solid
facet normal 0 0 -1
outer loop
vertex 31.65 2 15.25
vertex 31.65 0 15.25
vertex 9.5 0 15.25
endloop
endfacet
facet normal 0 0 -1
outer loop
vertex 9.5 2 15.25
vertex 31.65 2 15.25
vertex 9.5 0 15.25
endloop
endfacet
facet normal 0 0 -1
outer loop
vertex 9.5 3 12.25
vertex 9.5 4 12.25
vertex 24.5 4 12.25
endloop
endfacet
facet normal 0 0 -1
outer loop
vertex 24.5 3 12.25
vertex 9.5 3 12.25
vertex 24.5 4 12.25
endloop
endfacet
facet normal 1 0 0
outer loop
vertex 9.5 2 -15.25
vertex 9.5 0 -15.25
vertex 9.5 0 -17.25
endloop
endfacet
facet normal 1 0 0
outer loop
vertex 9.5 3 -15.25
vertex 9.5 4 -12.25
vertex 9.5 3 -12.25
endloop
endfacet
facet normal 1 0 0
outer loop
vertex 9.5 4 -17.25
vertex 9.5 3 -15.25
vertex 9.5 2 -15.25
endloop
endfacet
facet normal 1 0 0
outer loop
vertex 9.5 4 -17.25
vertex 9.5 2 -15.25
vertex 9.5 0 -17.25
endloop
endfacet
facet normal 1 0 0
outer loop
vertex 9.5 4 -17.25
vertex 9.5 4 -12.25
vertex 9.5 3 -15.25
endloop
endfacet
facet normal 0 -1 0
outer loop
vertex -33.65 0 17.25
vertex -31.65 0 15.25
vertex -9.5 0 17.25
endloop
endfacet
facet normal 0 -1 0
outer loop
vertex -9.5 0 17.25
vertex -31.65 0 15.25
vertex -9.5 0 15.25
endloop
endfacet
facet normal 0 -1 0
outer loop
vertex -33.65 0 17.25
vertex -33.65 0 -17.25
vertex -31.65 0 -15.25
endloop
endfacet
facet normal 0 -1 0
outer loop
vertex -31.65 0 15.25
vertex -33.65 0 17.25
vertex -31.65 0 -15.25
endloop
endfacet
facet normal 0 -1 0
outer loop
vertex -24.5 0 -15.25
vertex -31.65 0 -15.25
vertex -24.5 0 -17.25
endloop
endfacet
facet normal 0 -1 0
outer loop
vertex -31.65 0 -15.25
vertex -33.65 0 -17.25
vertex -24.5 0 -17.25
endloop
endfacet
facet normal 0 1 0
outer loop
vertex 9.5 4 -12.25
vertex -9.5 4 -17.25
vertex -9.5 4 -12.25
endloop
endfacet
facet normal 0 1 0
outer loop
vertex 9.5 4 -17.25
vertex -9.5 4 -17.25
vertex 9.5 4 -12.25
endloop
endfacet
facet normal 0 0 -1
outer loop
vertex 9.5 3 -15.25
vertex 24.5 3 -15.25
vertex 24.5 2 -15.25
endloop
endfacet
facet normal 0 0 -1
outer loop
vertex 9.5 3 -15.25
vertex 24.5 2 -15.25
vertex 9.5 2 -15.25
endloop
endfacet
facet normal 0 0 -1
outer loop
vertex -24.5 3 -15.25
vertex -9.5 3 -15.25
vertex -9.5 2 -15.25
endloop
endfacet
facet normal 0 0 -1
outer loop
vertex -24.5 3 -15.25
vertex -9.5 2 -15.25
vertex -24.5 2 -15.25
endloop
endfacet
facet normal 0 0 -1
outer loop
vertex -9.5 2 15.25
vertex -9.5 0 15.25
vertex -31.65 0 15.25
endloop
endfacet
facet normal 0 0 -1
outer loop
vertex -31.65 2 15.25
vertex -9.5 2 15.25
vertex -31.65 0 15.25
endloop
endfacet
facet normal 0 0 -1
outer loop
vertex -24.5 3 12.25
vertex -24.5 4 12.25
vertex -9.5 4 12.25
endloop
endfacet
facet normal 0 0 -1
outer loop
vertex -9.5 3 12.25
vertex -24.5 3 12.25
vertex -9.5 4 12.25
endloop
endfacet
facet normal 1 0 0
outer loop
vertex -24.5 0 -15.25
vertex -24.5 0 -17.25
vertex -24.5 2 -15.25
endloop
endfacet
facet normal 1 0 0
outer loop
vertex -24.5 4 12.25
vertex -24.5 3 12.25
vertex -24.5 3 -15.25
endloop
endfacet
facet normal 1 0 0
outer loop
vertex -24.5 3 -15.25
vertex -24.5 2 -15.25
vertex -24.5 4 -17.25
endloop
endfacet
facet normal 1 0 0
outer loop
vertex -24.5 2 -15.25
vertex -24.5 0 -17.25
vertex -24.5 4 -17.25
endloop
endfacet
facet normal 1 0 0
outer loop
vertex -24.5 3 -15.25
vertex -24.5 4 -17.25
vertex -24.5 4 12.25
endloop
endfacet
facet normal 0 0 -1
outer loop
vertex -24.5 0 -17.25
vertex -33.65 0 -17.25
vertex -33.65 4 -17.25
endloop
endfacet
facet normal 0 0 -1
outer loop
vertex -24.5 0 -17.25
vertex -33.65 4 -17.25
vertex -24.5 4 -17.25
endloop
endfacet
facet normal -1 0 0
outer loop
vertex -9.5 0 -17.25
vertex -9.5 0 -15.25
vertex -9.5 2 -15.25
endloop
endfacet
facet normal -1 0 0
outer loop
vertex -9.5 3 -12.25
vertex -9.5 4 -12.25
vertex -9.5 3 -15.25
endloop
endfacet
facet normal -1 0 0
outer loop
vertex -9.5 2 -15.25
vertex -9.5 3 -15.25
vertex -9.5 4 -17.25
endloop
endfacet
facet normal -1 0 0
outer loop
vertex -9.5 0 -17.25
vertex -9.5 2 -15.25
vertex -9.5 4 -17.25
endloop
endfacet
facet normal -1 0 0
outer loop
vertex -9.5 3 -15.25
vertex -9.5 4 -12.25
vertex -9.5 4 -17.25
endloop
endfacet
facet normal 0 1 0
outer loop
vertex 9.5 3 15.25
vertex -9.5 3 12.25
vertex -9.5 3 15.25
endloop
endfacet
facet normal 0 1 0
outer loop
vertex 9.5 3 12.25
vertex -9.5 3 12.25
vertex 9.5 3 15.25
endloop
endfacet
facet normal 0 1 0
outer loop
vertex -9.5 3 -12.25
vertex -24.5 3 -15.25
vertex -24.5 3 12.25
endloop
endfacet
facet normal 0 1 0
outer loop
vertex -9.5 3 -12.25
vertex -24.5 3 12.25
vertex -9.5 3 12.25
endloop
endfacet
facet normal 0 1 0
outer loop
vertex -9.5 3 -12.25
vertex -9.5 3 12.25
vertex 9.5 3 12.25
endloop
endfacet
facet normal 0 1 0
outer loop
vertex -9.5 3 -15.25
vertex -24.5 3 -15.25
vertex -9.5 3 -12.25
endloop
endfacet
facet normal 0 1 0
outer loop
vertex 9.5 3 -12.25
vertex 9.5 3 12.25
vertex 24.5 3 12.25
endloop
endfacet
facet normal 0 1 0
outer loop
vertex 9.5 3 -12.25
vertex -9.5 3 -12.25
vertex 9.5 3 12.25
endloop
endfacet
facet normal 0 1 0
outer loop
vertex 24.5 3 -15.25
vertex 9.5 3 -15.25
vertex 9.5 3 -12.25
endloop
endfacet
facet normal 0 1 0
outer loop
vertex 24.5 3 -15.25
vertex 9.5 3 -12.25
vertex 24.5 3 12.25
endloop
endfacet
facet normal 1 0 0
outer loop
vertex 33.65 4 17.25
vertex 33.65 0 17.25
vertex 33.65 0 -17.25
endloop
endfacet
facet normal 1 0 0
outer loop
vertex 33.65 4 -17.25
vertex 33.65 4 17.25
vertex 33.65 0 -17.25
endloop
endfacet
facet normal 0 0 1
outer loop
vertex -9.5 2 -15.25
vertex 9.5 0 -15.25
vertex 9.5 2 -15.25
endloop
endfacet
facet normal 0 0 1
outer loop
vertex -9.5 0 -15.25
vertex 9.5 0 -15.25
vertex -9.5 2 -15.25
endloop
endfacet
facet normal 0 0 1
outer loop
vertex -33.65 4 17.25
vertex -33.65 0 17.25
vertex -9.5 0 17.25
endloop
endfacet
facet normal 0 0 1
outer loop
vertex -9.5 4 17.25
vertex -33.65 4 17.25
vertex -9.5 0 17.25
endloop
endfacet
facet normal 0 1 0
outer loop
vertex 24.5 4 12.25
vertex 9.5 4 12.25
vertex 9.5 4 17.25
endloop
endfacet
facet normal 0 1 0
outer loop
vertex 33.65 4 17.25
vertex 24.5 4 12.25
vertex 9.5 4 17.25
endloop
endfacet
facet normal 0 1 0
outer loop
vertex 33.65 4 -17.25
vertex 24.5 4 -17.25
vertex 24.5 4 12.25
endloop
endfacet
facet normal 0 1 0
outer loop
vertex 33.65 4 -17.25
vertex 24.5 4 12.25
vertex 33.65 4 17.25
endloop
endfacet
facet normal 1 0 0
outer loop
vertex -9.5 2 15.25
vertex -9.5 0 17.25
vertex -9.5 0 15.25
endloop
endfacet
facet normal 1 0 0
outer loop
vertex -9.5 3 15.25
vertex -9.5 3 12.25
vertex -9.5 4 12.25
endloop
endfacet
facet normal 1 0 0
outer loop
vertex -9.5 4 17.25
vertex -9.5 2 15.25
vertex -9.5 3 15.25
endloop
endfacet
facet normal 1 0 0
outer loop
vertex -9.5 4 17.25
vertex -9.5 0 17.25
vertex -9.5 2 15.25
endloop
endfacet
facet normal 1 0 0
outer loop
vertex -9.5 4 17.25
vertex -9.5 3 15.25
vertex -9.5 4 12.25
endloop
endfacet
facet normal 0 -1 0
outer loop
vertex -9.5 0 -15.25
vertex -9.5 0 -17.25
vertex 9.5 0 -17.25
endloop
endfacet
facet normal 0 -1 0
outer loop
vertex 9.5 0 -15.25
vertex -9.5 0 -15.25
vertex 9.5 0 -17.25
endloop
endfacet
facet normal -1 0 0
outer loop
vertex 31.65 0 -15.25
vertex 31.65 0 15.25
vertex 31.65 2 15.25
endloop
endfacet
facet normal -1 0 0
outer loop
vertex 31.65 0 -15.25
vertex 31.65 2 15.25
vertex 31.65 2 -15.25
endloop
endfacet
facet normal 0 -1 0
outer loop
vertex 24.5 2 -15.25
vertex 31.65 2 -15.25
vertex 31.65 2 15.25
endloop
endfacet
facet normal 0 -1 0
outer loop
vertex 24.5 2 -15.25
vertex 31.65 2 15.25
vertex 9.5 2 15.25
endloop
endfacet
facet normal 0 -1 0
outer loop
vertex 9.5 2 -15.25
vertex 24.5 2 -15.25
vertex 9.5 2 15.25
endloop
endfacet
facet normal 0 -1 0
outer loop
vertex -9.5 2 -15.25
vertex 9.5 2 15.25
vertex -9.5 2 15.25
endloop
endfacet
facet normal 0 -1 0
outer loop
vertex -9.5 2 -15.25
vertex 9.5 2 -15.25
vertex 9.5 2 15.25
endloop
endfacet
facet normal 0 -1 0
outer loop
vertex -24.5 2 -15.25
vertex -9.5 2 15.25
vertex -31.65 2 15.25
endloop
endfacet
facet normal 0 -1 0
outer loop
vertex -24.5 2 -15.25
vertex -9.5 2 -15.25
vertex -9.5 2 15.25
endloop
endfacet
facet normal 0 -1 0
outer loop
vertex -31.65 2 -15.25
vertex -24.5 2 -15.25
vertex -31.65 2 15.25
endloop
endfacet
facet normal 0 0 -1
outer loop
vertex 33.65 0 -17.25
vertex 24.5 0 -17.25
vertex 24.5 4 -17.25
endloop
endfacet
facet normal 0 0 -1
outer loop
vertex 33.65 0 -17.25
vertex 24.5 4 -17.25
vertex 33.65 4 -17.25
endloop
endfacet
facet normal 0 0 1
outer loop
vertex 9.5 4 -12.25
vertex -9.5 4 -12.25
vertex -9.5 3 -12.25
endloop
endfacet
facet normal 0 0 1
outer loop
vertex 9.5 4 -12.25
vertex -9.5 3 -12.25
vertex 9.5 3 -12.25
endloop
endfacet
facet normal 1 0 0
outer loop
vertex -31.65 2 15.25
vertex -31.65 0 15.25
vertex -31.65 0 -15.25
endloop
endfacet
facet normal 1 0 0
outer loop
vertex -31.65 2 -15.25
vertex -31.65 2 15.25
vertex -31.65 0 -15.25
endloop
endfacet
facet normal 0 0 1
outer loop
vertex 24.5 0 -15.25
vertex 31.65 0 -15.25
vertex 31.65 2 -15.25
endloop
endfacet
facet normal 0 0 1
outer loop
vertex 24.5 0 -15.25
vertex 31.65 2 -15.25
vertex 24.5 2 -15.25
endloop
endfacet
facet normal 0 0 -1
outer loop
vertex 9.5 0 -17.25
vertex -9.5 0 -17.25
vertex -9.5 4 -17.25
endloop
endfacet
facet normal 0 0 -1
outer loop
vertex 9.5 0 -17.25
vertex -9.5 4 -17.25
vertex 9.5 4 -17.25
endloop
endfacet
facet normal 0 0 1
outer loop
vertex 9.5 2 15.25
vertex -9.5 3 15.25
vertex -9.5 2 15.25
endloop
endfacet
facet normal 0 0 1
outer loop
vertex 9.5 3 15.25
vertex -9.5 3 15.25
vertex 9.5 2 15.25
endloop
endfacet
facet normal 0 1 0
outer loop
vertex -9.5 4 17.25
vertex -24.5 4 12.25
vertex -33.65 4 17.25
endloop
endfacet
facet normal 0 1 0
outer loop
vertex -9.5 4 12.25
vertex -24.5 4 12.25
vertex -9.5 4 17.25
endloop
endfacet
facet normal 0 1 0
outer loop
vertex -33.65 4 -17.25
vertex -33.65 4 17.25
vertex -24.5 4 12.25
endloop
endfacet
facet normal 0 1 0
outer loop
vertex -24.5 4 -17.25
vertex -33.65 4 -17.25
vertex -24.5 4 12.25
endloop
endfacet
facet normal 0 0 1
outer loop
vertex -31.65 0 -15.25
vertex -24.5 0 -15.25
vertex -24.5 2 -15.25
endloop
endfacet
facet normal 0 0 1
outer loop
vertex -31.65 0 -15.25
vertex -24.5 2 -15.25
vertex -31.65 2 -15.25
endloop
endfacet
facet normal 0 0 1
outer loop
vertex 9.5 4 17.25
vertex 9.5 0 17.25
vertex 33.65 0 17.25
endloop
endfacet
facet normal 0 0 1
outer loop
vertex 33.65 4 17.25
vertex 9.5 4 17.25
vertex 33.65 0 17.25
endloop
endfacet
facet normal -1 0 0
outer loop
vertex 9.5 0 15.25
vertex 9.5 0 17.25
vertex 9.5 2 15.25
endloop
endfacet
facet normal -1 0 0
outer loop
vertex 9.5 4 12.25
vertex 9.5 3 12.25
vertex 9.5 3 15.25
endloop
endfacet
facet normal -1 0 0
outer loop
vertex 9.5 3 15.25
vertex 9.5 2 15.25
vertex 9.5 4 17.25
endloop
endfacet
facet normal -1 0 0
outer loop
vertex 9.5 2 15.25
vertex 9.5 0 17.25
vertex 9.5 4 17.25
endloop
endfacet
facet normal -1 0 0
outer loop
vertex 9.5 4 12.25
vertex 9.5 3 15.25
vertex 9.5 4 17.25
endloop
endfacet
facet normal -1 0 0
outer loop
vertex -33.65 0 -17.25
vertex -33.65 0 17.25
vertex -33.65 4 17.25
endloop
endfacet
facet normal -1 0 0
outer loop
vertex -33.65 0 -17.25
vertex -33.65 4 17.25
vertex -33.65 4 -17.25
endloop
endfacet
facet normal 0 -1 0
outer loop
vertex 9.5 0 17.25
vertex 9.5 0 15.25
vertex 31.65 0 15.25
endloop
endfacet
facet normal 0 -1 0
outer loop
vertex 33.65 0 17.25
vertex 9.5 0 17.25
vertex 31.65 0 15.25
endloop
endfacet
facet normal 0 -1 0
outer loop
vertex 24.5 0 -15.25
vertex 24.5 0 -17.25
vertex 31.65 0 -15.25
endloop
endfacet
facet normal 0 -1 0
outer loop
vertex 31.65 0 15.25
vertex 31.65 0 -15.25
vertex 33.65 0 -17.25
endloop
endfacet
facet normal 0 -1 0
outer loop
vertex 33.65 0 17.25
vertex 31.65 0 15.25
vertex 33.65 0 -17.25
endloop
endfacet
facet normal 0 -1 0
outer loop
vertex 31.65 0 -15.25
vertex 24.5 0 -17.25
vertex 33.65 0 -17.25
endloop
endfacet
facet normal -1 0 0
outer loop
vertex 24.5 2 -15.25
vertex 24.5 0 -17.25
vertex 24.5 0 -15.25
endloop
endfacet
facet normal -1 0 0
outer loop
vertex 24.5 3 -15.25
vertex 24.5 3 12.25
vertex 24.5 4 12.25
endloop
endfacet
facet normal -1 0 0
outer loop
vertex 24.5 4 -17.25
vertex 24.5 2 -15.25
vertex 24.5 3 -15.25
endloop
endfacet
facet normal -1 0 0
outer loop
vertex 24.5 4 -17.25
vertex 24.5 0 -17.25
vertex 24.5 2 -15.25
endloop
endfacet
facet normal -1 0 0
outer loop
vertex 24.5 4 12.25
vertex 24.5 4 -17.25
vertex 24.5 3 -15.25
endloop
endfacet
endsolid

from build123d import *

# Parameters (mm, degrees)
SKETCH_1_W          = 67.3
SKETCH_1_H          = 34.5
EXTRUDE_1_DEPTH     = 4
SKETCH_2_W          = 15
SKETCH_2_H          = 29.5
CUT_EXTRUDE_1_DEPTH = 1
SKETCH_3_W          = 63.3
SKETCH_3_H          = 30.5
CUT_EXTRUDE_2_DEPTH = 2
SKETCH_4_W          = 15
SKETCH_4_H          = 3
CUT_EXTRUDE_3_DEPTH = 2
SKETCH_6_W          = 19
SKETCH_6_H          = 29.5
CUT_EXTRUDE_5_DEPTH = 1
SKETCH_5_W          = 19
SKETCH_5_H          = 3
CUT_EXTRUDE_4_DEPTH = 2


with BuildPart() as part:
    # Эскиз1 → Бобышка-Вытянуть1 (new body)
    with BuildSketch(Plane(origin=(0, 0, 0), x_dir=(1, 0, 0), z_dir=(0, 1, 0))):
        Rectangle(SKETCH_1_W, SKETCH_1_H)
    extrude(amount=EXTRUDE_1_DEPTH)

    # Эскиз2 → Вырез-Вытянуть1 (cut)
    with BuildSketch(Plane(origin=(0, 4, 0), x_dir=(1, 0, 0), z_dir=(0, 1, 0))):
        with Locations((-17, 2.5)):
            Rectangle(SKETCH_2_W, SKETCH_2_H)
        with Locations((17, 2.5)):
            Rectangle(SKETCH_2_W, SKETCH_2_H)
    extrude(amount=-CUT_EXTRUDE_1_DEPTH, mode=Mode.SUBTRACT)

    # Эскиз3 → Вырез-Вытянуть2 (cut)
    with BuildSketch(Plane(origin=(0, 0, 0), x_dir=(-1, 0, 0), z_dir=(0, -1, 0))):
        Rectangle(SKETCH_3_W, SKETCH_3_H)
    extrude(amount=-CUT_EXTRUDE_2_DEPTH, mode=Mode.SUBTRACT)

    # Эскиз4 → Вырез-Вытянуть3 (cut)
    with BuildSketch(Plane(origin=(0, 0, -17.25), x_dir=(-1, 0, 0), z_dir=(0, 0, -1))):
        with Locations((-17, 1.5)):
            Rectangle(SKETCH_4_W, SKETCH_4_H)
        with Locations((17, 1.5)):
            Rectangle(SKETCH_4_W, SKETCH_4_H)
    extrude(amount=-CUT_EXTRUDE_3_DEPTH, mode=Mode.SUBTRACT)

    # Эскиз6 → Вырез-Вытянуть5 (cut)
    with BuildSketch(Plane(origin=(0, 4, 0), x_dir=(1, 0, 0), z_dir=(0, 1, 0))):
        with Locations((0, -2.5)):
            Rectangle(SKETCH_6_W, SKETCH_6_H)
    extrude(amount=-CUT_EXTRUDE_5_DEPTH, mode=Mode.SUBTRACT)

    # Эскиз5 → Вырез-Вытянуть4 (cut)
    with BuildSketch(Plane.XY.offset(17.25)):
        with Locations((0, 1.5)):
            Rectangle(SKETCH_5_W, SKETCH_5_H)
    extrude(amount=-CUT_EXTRUDE_4_DEPTH, mode=Mode.SUBTRACT)


solid = part.part
